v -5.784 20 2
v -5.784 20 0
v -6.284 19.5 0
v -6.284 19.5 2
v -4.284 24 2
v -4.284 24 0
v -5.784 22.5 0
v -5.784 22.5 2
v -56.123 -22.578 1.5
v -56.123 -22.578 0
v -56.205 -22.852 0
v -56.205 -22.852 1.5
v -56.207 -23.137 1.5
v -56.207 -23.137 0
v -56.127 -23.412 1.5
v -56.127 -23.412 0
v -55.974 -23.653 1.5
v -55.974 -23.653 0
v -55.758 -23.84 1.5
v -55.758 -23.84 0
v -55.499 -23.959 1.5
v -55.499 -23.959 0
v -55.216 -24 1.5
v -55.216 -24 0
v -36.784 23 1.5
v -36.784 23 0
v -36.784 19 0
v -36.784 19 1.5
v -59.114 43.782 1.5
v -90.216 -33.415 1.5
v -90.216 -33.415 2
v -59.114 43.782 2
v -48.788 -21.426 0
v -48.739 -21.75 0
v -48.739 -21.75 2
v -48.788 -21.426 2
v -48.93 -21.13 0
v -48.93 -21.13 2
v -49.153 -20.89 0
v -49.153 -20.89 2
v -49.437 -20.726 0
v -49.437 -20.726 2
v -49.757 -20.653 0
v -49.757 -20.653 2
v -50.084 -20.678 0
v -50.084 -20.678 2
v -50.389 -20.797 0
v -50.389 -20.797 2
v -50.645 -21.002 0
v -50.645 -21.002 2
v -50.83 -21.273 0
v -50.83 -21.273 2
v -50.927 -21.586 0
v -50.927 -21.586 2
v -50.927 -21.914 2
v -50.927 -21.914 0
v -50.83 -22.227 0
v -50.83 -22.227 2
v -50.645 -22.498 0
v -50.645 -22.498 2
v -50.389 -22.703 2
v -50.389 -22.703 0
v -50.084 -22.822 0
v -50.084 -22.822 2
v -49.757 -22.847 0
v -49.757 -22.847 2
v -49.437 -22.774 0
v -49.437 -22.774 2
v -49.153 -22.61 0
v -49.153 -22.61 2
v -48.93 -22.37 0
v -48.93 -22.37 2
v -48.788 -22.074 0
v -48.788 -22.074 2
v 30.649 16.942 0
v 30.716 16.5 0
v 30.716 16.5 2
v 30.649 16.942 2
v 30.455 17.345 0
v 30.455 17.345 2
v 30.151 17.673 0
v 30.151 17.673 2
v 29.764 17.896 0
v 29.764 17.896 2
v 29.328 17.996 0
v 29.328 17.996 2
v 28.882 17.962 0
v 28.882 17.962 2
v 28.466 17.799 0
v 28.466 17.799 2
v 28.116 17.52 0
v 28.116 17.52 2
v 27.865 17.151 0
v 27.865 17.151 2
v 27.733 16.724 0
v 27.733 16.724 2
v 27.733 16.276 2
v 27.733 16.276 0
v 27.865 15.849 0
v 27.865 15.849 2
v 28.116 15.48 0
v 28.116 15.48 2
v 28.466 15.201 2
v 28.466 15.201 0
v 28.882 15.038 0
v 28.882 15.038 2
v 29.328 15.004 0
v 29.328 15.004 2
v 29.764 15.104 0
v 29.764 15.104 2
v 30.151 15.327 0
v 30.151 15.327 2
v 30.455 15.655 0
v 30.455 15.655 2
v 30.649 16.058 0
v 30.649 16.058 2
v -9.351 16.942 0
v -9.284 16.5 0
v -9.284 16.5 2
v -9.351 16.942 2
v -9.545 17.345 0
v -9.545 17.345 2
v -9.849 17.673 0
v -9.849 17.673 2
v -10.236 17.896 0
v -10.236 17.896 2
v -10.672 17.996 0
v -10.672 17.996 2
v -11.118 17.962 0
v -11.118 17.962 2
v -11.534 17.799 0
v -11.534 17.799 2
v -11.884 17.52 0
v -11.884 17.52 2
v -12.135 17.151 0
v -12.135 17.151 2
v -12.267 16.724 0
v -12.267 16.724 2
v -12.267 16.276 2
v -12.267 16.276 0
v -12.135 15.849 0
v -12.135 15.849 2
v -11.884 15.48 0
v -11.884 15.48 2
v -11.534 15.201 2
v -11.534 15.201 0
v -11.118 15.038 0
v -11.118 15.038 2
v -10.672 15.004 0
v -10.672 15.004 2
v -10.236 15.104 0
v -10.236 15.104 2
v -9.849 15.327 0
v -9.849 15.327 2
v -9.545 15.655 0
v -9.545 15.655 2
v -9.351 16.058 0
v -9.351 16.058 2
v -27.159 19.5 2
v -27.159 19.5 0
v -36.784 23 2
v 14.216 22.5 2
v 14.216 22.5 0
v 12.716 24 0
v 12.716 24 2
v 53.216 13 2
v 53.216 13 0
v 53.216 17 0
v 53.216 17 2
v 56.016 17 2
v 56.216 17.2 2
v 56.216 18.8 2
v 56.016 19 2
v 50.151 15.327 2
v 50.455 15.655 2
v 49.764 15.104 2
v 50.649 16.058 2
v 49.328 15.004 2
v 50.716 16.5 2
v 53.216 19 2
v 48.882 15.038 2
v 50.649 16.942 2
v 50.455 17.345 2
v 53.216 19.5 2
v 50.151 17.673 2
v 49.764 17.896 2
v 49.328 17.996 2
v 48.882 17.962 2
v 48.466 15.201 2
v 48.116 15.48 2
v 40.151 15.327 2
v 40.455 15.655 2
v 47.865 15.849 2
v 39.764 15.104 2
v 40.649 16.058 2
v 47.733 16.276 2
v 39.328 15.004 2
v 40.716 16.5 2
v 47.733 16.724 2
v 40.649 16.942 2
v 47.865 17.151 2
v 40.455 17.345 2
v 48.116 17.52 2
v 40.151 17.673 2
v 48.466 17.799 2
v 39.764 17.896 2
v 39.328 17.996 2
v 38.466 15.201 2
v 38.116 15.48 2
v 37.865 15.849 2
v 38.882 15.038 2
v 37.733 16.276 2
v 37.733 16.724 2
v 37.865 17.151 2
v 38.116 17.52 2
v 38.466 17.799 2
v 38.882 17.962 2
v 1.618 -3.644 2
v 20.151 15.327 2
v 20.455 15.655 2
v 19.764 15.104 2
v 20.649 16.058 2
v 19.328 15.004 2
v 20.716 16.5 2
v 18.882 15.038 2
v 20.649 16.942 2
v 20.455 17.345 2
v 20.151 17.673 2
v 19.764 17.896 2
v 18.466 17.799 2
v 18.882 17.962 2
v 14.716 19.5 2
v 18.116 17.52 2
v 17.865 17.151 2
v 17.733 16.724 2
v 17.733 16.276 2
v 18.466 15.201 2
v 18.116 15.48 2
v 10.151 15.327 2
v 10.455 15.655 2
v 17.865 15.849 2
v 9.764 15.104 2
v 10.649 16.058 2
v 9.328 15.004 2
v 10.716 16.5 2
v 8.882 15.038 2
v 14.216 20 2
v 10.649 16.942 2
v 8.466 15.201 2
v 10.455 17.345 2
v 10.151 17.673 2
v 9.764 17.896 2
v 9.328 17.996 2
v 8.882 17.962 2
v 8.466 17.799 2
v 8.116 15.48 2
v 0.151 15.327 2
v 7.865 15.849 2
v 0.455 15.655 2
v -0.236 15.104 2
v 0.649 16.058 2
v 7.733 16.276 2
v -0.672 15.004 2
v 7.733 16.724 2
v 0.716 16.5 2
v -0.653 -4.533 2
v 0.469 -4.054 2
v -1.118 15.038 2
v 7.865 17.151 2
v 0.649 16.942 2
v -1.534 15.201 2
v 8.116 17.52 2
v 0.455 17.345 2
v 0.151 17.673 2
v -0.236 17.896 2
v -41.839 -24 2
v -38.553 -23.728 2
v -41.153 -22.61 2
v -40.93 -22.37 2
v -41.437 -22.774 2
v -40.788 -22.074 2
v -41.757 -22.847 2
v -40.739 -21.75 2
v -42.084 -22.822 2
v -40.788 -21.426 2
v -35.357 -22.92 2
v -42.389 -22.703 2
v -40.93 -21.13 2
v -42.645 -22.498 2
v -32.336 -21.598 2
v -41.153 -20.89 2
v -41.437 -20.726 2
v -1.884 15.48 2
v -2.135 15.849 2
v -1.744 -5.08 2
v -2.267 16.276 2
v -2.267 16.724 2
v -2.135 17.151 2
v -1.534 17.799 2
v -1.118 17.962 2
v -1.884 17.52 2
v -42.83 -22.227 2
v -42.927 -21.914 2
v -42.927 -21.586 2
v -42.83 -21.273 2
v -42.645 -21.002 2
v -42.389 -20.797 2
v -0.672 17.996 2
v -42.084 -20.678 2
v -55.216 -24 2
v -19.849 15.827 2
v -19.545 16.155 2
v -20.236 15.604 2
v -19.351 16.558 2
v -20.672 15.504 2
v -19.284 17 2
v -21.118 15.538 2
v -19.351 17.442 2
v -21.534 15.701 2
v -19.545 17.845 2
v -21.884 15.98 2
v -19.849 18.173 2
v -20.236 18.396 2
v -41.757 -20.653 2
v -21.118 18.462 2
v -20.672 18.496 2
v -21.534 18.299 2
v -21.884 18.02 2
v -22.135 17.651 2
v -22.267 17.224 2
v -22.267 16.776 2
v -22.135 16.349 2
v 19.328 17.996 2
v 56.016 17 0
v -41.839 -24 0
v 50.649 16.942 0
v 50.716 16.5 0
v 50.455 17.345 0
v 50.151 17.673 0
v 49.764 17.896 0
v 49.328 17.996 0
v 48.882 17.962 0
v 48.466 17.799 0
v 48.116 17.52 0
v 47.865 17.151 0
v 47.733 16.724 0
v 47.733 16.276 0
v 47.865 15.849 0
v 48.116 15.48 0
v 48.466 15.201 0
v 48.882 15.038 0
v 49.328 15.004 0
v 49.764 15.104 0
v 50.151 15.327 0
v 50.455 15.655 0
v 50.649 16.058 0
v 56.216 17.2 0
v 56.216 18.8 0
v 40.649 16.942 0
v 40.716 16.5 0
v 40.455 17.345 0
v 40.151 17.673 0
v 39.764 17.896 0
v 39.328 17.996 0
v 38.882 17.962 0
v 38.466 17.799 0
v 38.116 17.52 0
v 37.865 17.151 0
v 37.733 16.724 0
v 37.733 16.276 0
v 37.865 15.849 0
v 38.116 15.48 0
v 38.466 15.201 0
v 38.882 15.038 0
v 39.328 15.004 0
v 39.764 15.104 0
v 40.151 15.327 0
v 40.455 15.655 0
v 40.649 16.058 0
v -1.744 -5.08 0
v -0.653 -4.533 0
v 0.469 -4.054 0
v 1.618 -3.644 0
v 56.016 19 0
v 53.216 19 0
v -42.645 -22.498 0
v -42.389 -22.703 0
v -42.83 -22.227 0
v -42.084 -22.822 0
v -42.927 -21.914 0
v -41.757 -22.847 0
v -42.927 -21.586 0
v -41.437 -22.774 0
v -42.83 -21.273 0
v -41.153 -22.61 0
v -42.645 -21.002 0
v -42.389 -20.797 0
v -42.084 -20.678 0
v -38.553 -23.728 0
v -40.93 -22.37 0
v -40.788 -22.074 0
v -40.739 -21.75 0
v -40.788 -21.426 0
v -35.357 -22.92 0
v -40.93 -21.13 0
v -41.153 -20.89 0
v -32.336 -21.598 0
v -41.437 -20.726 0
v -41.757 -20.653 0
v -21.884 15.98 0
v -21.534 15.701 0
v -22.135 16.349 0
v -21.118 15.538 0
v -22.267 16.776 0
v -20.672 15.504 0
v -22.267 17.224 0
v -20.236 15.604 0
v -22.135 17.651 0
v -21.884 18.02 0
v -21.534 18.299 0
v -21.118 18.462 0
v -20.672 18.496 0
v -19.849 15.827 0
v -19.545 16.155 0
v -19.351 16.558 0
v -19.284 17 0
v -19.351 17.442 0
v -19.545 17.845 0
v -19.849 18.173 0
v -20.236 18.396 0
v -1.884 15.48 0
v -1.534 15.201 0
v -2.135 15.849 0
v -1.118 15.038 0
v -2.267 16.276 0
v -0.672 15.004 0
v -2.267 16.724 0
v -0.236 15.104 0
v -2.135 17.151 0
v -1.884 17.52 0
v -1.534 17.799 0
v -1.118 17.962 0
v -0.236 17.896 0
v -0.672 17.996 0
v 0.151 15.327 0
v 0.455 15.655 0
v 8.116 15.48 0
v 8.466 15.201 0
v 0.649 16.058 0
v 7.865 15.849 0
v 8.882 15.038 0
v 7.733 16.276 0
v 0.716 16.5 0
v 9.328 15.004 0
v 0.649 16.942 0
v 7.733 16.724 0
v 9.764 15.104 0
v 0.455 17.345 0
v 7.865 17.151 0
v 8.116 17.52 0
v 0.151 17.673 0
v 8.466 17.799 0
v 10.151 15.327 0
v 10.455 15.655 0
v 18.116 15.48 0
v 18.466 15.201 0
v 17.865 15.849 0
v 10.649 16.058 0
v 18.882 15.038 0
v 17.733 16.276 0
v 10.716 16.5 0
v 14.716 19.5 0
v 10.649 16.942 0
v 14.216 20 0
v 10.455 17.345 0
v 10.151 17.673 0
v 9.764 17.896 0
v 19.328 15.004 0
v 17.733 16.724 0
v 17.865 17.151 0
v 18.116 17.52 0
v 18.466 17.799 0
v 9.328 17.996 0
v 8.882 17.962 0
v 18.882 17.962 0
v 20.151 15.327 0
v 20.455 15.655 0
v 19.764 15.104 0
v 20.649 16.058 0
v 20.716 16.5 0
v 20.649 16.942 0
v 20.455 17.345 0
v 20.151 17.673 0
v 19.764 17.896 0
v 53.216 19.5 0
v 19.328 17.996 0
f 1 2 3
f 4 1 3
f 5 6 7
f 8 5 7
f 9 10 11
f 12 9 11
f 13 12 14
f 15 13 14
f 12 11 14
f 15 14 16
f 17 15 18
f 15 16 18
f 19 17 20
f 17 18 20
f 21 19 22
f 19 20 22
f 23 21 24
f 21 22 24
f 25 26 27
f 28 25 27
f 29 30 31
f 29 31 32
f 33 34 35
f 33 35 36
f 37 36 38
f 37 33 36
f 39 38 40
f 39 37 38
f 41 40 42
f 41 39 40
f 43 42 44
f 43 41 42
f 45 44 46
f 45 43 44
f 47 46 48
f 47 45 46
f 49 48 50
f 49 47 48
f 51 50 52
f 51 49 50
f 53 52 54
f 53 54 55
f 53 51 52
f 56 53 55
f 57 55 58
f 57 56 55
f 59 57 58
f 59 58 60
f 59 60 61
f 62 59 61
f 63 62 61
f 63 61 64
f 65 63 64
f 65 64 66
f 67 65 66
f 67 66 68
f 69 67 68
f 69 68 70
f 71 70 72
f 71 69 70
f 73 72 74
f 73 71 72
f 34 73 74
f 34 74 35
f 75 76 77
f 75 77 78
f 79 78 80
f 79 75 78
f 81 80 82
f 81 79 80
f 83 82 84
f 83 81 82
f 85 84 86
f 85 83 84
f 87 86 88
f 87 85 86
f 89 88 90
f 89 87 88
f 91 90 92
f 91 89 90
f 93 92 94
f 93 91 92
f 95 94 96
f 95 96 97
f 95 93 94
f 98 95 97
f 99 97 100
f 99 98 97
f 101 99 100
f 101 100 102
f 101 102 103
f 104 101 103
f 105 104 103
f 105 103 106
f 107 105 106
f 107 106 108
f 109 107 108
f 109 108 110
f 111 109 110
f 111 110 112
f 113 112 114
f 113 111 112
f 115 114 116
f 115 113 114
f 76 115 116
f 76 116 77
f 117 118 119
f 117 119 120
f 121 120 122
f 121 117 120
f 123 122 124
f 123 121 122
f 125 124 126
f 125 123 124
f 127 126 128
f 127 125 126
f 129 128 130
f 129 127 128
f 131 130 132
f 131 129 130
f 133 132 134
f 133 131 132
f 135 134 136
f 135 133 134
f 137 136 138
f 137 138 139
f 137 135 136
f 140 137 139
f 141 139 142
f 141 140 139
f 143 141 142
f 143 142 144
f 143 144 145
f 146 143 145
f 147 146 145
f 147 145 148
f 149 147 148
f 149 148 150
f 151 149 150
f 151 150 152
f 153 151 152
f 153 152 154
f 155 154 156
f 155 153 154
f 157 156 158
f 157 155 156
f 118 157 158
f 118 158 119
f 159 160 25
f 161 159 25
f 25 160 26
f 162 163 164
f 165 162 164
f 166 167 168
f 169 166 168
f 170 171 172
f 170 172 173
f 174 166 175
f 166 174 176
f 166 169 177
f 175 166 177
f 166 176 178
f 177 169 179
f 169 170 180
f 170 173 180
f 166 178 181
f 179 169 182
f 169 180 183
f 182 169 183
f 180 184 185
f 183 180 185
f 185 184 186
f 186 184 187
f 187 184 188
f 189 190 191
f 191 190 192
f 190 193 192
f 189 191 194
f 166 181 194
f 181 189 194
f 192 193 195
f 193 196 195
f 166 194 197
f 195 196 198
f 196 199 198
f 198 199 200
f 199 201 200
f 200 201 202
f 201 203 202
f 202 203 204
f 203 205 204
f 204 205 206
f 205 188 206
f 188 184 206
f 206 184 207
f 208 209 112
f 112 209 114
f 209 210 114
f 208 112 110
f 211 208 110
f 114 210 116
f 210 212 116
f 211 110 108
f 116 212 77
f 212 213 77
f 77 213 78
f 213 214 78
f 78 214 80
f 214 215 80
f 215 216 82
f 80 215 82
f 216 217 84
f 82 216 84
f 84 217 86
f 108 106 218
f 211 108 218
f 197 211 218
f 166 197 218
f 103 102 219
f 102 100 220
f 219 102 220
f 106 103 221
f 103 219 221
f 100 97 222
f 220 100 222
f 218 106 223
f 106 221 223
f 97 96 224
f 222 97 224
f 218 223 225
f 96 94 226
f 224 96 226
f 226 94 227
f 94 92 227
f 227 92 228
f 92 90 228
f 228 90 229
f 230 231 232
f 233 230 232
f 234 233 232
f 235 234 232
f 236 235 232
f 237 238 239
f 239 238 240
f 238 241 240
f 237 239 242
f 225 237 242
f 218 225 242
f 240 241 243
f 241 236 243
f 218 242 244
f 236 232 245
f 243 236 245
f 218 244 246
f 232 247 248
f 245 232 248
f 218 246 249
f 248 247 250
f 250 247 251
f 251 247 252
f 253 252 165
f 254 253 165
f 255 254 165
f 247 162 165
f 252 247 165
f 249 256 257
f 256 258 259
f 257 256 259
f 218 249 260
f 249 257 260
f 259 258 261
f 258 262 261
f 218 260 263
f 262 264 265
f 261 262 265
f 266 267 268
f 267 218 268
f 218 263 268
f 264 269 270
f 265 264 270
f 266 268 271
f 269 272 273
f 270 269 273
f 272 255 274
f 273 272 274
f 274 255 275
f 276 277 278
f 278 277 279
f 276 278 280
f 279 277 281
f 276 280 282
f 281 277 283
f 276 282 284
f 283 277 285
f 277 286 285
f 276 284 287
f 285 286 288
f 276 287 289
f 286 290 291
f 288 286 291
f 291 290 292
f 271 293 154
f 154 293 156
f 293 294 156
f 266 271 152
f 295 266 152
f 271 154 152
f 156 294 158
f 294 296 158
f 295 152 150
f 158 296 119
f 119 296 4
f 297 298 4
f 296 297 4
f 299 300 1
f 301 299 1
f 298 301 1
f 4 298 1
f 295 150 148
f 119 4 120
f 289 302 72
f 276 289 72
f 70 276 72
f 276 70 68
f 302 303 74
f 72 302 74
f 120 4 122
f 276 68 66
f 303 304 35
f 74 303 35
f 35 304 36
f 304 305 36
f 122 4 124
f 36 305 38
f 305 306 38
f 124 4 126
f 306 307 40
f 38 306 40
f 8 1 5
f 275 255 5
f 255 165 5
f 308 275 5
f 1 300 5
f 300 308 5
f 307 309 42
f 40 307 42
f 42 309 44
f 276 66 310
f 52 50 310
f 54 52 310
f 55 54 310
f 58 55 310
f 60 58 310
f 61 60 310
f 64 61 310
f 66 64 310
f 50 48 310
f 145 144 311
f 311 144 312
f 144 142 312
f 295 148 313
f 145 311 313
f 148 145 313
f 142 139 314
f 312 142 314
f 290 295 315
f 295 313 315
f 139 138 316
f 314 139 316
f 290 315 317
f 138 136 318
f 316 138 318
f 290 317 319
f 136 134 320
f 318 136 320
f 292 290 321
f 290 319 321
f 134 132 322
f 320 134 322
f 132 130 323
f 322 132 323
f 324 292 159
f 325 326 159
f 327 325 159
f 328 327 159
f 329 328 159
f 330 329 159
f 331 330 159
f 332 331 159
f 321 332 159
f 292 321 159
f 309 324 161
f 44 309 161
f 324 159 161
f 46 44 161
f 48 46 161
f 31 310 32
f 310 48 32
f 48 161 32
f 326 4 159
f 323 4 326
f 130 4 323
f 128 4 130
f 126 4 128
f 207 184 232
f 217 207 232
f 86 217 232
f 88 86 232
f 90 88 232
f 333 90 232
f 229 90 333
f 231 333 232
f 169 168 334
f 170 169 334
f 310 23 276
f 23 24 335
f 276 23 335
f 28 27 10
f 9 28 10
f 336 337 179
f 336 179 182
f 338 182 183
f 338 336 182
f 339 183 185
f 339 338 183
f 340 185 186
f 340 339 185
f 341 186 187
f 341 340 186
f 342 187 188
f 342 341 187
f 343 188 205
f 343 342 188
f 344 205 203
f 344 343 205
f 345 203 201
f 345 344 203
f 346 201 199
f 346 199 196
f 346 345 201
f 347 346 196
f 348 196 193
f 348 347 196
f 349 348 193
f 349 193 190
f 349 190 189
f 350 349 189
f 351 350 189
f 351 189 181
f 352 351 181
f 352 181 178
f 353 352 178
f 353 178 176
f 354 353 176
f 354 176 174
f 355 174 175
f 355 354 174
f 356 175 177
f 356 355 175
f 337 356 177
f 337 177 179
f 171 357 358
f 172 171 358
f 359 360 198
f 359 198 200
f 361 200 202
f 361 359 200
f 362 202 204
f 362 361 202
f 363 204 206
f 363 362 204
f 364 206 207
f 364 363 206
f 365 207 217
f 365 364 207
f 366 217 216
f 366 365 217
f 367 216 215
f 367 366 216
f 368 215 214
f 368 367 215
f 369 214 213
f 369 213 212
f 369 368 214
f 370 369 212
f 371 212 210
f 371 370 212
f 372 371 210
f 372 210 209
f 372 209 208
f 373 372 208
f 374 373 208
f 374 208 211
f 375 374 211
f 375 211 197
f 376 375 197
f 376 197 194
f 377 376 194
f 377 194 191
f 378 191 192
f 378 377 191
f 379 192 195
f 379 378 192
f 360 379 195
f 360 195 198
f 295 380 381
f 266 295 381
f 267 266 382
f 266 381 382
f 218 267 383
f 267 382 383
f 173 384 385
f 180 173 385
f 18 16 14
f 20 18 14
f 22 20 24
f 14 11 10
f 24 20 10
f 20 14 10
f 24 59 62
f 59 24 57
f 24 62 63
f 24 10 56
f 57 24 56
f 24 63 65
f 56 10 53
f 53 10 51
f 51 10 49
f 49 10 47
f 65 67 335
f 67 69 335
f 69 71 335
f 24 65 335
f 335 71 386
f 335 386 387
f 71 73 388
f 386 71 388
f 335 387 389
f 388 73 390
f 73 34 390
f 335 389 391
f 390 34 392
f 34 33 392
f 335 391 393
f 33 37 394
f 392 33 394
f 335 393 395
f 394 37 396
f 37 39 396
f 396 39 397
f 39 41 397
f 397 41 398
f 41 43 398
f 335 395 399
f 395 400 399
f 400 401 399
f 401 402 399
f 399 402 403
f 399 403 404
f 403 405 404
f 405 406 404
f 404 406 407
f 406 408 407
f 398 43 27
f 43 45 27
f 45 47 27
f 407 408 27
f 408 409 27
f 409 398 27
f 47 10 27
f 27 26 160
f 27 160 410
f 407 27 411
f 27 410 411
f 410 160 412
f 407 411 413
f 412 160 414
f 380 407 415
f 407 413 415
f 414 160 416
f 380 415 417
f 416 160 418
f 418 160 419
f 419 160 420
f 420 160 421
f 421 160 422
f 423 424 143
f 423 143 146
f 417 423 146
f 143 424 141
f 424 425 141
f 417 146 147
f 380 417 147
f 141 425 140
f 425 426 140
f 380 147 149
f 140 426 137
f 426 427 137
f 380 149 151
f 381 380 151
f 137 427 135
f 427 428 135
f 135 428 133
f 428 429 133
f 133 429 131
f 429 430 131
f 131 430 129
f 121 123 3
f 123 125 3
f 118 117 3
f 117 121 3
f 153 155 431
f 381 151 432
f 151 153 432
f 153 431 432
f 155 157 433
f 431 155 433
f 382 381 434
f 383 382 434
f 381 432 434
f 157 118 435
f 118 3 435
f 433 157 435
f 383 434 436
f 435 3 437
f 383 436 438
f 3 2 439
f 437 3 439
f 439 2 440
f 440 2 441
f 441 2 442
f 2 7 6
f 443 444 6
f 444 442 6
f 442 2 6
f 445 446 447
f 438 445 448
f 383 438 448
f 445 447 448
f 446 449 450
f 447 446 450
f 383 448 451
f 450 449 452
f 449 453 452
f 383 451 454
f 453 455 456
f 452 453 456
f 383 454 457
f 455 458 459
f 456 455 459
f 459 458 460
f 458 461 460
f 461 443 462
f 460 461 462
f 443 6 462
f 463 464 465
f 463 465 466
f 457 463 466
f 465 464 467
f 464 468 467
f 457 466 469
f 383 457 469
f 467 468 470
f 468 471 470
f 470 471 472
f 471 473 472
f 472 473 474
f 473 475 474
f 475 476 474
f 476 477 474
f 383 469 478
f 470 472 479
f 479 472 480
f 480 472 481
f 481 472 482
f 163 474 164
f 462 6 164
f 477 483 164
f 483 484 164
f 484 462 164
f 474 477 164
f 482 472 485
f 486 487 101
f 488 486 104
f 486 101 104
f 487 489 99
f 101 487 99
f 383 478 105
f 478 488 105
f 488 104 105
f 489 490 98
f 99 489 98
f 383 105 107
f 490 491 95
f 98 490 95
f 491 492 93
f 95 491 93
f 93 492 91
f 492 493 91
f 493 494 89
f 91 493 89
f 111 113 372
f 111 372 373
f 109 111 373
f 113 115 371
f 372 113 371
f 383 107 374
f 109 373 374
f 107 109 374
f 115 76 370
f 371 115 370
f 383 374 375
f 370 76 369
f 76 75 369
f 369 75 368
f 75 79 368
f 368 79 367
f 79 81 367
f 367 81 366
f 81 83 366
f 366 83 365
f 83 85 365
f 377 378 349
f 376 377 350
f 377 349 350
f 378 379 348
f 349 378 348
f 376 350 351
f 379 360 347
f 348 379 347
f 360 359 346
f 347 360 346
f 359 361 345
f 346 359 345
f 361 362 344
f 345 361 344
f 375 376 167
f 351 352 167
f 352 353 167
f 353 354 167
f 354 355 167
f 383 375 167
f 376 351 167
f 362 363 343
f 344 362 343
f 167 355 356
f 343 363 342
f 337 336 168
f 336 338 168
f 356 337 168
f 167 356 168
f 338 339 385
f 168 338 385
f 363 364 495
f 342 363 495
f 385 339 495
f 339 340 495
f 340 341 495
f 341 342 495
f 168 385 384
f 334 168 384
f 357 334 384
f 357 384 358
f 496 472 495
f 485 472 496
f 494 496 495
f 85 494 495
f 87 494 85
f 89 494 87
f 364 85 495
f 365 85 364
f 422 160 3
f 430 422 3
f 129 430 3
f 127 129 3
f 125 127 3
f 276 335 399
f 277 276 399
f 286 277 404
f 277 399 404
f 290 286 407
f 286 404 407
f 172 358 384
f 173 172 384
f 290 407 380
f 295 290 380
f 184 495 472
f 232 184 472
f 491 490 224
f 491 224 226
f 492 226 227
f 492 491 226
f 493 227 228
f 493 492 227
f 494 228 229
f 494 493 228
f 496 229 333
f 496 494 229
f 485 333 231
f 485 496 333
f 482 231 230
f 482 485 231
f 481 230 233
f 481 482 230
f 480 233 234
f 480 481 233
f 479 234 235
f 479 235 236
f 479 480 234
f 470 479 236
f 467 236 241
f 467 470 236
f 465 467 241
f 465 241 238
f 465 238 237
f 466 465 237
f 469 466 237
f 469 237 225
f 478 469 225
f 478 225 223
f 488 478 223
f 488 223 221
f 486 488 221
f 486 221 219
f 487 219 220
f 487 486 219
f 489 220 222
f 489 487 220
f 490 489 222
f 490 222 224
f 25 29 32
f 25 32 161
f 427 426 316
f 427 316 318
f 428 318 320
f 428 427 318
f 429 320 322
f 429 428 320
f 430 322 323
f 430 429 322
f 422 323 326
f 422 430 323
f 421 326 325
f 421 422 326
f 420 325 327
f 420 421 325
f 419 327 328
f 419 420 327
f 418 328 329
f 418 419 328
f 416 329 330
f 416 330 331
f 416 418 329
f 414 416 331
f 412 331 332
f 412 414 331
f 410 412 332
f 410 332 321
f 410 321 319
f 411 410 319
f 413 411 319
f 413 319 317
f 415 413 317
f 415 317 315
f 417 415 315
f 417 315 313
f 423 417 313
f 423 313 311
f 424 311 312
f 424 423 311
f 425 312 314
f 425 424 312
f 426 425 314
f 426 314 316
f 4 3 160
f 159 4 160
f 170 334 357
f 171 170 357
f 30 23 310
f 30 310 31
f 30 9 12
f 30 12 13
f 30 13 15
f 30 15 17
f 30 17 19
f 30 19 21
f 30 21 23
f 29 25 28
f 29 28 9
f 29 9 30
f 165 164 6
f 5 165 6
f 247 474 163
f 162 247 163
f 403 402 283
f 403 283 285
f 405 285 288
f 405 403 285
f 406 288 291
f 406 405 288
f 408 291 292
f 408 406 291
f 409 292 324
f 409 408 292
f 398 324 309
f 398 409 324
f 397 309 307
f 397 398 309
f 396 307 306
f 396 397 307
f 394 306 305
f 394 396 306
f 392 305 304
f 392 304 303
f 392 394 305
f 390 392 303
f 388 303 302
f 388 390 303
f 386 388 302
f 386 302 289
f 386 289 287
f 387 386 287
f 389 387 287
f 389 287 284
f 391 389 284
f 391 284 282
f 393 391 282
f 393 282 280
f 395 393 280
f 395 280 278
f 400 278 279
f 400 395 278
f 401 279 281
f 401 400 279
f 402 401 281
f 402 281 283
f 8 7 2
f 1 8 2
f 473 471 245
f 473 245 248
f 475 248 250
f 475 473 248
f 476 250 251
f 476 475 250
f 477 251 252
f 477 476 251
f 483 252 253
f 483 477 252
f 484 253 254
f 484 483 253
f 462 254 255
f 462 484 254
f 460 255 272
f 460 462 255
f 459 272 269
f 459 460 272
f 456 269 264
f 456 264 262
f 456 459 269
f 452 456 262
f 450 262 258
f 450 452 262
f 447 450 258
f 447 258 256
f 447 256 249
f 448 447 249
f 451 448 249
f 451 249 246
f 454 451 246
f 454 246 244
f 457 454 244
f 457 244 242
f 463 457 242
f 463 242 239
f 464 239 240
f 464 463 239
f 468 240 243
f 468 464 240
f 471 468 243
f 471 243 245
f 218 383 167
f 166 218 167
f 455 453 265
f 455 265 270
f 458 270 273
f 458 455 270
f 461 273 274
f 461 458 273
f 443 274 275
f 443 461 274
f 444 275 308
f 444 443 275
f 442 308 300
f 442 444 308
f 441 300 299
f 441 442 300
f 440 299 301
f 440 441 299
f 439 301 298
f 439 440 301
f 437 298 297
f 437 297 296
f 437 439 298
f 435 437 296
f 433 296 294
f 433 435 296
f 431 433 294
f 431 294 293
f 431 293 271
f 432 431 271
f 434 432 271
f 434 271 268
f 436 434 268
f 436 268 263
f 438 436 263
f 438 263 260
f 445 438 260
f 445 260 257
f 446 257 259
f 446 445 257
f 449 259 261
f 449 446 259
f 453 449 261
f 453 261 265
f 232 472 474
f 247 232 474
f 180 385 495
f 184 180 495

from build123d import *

# Parameters (mm, degrees)
SKETCH_1_R      = 1.1
SKETCH_1_R_2    = 1.5
EXTRUDE_1_DEPTH = 2
EXTRUDE_START   = -0.5
EXTRUDE_2_DEPTH = 0.5


with BuildPart() as part:
    # 草图1 → 凸台-拉伸1 (new body)
    with BuildSketch(Plane.XY):
        with BuildLine():
            Line((56.016004386, 19), (53.216004386, 19))
            Line((53.216004386, 19), (53.216004386, 19.5))
            Line((53.216004386, 19.5), (14.716004386, 19.5))
            Line((14.716004386, 19.5), (14.216004386, 20))
            Line((14.216004386, 20), (14.216004386, 22.5))
            Line((14.216004386, 22.5), (12.716004386, 24))
            Line((12.716004386, 24), (-4.283995614, 24))
            Line((-4.283995614, 24), (-5.783995614, 22.5))
            Line((-5.783995614, 22.5), (-5.783995614, 20))
            Line((-5.783995614, 20), (-6.283995614, 19.5))
            Line((-6.283995614, 19.5), (-27.158995614, 19.5))
            Line((-27.158995614, 19.5), (-36.783995614, 23))
            Line((-36.783995614, 23), (-36.783995614, 19))
            Line((-36.783995614, 19), (-56.122725498, -22.57826925))
            ThreePointArc((-56.122725498, -22.57826925), (-56.059132712, -23.5377124), (-55.216004386, -24))
            Line((-55.216004386, -24), (-41.838790186, -24))
            ThreePointArc((-41.838790186, -24), (-36.938094618, -23.390285788), (-32.336201424, -21.598318295))
            Line((-32.336201424, -21.598318295), (-1.744334209, -5.079584588))
            ThreePointArc((-1.744334209, -5.079584588), (-0.095831441, -4.284607006), (1.618440476, -3.643652619))
            Line((1.618440476, -3.643652619), (53.216004386, 13))
            Line((53.216004386, 13), (53.216004386, 17))
            Line((53.216004386, 17), (56.016004386, 17))
            Line((56.016004386, 17), (56.216004386, 17.2))
            Line((56.216004386, 17.2), (56.216004386, 18.8))
            Line((56.216004386, 18.8), (56.016004386, 19))
        make_face()
        with Locations((-41.838790186, -21.75)):
            Circle(SKETCH_1_R, mode=Mode.SUBTRACT)
        with Locations((-49.838790186, -21.75)):
            Circle(SKETCH_1_R, mode=Mode.SUBTRACT)
        with Locations((49.216004386, 16.5)):
            Circle(SKETCH_1_R_2, mode=Mode.SUBTRACT)
        with Locations((39.216004386, 16.5)):
            Circle(SKETCH_1_R_2, mode=Mode.SUBTRACT)
        with Locations((29.216004386, 16.5)):
            Circle(SKETCH_1_R_2, mode=Mode.SUBTRACT)
        with Locations((19.216004386, 16.5)):
            Circle(SKETCH_1_R_2, mode=Mode.SUBTRACT)
        with Locations((9.216004386, 16.5)):
            Circle(SKETCH_1_R_2, mode=Mode.SUBTRACT)
        with Locations((-0.783995614, 16.5)):
            Circle(SKETCH_1_R_2, mode=Mode.SUBTRACT)
        with Locations((-10.783995614, 16.5)):
            Circle(SKETCH_1_R_2, mode=Mode.SUBTRACT)
        with Locations((-20.783995614, 17)):
            Circle(SKETCH_1_R_2, mode=Mode.SUBTRACT)
    extrude(amount=EXTRUDE_1_DEPTH)

    # 草图2 → 凸台-拉伸2 (add)
    with BuildSketch(Plane.XY.offset(2).offset(EXTRUDE_START)):
        with BuildLine():
            Line((-55.216004386, -24), (-90.216004386, -33.41495792))
            Line((-90.216004386, -33.41495792), (-59.114143441, 43.782364027))
            Line((-59.114143441, 43.782364027), (-36.783995614, 23))
            Line((-36.783995614, 23), (-36.783995614, 19))
            Line((-36.783995614, 19), (-56.122725498, -22.57826925))
            ThreePointArc((-56.122725498, -22.57826925), (-56.059132712, -23.5377124), (-55.216004386, -24))
        make_face()
    extrude(amount=EXTRUDE_2_DEPTH)


solid = part.part
